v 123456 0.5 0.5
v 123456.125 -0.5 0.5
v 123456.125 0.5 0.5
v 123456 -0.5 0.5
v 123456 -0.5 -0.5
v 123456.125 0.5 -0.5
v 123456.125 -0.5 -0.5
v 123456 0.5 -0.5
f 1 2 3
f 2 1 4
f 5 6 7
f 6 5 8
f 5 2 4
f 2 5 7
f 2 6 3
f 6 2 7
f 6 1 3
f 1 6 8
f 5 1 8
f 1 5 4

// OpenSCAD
translate([123456.0625, 0, 0]) cube([0.125, 1, 1], center = true);
